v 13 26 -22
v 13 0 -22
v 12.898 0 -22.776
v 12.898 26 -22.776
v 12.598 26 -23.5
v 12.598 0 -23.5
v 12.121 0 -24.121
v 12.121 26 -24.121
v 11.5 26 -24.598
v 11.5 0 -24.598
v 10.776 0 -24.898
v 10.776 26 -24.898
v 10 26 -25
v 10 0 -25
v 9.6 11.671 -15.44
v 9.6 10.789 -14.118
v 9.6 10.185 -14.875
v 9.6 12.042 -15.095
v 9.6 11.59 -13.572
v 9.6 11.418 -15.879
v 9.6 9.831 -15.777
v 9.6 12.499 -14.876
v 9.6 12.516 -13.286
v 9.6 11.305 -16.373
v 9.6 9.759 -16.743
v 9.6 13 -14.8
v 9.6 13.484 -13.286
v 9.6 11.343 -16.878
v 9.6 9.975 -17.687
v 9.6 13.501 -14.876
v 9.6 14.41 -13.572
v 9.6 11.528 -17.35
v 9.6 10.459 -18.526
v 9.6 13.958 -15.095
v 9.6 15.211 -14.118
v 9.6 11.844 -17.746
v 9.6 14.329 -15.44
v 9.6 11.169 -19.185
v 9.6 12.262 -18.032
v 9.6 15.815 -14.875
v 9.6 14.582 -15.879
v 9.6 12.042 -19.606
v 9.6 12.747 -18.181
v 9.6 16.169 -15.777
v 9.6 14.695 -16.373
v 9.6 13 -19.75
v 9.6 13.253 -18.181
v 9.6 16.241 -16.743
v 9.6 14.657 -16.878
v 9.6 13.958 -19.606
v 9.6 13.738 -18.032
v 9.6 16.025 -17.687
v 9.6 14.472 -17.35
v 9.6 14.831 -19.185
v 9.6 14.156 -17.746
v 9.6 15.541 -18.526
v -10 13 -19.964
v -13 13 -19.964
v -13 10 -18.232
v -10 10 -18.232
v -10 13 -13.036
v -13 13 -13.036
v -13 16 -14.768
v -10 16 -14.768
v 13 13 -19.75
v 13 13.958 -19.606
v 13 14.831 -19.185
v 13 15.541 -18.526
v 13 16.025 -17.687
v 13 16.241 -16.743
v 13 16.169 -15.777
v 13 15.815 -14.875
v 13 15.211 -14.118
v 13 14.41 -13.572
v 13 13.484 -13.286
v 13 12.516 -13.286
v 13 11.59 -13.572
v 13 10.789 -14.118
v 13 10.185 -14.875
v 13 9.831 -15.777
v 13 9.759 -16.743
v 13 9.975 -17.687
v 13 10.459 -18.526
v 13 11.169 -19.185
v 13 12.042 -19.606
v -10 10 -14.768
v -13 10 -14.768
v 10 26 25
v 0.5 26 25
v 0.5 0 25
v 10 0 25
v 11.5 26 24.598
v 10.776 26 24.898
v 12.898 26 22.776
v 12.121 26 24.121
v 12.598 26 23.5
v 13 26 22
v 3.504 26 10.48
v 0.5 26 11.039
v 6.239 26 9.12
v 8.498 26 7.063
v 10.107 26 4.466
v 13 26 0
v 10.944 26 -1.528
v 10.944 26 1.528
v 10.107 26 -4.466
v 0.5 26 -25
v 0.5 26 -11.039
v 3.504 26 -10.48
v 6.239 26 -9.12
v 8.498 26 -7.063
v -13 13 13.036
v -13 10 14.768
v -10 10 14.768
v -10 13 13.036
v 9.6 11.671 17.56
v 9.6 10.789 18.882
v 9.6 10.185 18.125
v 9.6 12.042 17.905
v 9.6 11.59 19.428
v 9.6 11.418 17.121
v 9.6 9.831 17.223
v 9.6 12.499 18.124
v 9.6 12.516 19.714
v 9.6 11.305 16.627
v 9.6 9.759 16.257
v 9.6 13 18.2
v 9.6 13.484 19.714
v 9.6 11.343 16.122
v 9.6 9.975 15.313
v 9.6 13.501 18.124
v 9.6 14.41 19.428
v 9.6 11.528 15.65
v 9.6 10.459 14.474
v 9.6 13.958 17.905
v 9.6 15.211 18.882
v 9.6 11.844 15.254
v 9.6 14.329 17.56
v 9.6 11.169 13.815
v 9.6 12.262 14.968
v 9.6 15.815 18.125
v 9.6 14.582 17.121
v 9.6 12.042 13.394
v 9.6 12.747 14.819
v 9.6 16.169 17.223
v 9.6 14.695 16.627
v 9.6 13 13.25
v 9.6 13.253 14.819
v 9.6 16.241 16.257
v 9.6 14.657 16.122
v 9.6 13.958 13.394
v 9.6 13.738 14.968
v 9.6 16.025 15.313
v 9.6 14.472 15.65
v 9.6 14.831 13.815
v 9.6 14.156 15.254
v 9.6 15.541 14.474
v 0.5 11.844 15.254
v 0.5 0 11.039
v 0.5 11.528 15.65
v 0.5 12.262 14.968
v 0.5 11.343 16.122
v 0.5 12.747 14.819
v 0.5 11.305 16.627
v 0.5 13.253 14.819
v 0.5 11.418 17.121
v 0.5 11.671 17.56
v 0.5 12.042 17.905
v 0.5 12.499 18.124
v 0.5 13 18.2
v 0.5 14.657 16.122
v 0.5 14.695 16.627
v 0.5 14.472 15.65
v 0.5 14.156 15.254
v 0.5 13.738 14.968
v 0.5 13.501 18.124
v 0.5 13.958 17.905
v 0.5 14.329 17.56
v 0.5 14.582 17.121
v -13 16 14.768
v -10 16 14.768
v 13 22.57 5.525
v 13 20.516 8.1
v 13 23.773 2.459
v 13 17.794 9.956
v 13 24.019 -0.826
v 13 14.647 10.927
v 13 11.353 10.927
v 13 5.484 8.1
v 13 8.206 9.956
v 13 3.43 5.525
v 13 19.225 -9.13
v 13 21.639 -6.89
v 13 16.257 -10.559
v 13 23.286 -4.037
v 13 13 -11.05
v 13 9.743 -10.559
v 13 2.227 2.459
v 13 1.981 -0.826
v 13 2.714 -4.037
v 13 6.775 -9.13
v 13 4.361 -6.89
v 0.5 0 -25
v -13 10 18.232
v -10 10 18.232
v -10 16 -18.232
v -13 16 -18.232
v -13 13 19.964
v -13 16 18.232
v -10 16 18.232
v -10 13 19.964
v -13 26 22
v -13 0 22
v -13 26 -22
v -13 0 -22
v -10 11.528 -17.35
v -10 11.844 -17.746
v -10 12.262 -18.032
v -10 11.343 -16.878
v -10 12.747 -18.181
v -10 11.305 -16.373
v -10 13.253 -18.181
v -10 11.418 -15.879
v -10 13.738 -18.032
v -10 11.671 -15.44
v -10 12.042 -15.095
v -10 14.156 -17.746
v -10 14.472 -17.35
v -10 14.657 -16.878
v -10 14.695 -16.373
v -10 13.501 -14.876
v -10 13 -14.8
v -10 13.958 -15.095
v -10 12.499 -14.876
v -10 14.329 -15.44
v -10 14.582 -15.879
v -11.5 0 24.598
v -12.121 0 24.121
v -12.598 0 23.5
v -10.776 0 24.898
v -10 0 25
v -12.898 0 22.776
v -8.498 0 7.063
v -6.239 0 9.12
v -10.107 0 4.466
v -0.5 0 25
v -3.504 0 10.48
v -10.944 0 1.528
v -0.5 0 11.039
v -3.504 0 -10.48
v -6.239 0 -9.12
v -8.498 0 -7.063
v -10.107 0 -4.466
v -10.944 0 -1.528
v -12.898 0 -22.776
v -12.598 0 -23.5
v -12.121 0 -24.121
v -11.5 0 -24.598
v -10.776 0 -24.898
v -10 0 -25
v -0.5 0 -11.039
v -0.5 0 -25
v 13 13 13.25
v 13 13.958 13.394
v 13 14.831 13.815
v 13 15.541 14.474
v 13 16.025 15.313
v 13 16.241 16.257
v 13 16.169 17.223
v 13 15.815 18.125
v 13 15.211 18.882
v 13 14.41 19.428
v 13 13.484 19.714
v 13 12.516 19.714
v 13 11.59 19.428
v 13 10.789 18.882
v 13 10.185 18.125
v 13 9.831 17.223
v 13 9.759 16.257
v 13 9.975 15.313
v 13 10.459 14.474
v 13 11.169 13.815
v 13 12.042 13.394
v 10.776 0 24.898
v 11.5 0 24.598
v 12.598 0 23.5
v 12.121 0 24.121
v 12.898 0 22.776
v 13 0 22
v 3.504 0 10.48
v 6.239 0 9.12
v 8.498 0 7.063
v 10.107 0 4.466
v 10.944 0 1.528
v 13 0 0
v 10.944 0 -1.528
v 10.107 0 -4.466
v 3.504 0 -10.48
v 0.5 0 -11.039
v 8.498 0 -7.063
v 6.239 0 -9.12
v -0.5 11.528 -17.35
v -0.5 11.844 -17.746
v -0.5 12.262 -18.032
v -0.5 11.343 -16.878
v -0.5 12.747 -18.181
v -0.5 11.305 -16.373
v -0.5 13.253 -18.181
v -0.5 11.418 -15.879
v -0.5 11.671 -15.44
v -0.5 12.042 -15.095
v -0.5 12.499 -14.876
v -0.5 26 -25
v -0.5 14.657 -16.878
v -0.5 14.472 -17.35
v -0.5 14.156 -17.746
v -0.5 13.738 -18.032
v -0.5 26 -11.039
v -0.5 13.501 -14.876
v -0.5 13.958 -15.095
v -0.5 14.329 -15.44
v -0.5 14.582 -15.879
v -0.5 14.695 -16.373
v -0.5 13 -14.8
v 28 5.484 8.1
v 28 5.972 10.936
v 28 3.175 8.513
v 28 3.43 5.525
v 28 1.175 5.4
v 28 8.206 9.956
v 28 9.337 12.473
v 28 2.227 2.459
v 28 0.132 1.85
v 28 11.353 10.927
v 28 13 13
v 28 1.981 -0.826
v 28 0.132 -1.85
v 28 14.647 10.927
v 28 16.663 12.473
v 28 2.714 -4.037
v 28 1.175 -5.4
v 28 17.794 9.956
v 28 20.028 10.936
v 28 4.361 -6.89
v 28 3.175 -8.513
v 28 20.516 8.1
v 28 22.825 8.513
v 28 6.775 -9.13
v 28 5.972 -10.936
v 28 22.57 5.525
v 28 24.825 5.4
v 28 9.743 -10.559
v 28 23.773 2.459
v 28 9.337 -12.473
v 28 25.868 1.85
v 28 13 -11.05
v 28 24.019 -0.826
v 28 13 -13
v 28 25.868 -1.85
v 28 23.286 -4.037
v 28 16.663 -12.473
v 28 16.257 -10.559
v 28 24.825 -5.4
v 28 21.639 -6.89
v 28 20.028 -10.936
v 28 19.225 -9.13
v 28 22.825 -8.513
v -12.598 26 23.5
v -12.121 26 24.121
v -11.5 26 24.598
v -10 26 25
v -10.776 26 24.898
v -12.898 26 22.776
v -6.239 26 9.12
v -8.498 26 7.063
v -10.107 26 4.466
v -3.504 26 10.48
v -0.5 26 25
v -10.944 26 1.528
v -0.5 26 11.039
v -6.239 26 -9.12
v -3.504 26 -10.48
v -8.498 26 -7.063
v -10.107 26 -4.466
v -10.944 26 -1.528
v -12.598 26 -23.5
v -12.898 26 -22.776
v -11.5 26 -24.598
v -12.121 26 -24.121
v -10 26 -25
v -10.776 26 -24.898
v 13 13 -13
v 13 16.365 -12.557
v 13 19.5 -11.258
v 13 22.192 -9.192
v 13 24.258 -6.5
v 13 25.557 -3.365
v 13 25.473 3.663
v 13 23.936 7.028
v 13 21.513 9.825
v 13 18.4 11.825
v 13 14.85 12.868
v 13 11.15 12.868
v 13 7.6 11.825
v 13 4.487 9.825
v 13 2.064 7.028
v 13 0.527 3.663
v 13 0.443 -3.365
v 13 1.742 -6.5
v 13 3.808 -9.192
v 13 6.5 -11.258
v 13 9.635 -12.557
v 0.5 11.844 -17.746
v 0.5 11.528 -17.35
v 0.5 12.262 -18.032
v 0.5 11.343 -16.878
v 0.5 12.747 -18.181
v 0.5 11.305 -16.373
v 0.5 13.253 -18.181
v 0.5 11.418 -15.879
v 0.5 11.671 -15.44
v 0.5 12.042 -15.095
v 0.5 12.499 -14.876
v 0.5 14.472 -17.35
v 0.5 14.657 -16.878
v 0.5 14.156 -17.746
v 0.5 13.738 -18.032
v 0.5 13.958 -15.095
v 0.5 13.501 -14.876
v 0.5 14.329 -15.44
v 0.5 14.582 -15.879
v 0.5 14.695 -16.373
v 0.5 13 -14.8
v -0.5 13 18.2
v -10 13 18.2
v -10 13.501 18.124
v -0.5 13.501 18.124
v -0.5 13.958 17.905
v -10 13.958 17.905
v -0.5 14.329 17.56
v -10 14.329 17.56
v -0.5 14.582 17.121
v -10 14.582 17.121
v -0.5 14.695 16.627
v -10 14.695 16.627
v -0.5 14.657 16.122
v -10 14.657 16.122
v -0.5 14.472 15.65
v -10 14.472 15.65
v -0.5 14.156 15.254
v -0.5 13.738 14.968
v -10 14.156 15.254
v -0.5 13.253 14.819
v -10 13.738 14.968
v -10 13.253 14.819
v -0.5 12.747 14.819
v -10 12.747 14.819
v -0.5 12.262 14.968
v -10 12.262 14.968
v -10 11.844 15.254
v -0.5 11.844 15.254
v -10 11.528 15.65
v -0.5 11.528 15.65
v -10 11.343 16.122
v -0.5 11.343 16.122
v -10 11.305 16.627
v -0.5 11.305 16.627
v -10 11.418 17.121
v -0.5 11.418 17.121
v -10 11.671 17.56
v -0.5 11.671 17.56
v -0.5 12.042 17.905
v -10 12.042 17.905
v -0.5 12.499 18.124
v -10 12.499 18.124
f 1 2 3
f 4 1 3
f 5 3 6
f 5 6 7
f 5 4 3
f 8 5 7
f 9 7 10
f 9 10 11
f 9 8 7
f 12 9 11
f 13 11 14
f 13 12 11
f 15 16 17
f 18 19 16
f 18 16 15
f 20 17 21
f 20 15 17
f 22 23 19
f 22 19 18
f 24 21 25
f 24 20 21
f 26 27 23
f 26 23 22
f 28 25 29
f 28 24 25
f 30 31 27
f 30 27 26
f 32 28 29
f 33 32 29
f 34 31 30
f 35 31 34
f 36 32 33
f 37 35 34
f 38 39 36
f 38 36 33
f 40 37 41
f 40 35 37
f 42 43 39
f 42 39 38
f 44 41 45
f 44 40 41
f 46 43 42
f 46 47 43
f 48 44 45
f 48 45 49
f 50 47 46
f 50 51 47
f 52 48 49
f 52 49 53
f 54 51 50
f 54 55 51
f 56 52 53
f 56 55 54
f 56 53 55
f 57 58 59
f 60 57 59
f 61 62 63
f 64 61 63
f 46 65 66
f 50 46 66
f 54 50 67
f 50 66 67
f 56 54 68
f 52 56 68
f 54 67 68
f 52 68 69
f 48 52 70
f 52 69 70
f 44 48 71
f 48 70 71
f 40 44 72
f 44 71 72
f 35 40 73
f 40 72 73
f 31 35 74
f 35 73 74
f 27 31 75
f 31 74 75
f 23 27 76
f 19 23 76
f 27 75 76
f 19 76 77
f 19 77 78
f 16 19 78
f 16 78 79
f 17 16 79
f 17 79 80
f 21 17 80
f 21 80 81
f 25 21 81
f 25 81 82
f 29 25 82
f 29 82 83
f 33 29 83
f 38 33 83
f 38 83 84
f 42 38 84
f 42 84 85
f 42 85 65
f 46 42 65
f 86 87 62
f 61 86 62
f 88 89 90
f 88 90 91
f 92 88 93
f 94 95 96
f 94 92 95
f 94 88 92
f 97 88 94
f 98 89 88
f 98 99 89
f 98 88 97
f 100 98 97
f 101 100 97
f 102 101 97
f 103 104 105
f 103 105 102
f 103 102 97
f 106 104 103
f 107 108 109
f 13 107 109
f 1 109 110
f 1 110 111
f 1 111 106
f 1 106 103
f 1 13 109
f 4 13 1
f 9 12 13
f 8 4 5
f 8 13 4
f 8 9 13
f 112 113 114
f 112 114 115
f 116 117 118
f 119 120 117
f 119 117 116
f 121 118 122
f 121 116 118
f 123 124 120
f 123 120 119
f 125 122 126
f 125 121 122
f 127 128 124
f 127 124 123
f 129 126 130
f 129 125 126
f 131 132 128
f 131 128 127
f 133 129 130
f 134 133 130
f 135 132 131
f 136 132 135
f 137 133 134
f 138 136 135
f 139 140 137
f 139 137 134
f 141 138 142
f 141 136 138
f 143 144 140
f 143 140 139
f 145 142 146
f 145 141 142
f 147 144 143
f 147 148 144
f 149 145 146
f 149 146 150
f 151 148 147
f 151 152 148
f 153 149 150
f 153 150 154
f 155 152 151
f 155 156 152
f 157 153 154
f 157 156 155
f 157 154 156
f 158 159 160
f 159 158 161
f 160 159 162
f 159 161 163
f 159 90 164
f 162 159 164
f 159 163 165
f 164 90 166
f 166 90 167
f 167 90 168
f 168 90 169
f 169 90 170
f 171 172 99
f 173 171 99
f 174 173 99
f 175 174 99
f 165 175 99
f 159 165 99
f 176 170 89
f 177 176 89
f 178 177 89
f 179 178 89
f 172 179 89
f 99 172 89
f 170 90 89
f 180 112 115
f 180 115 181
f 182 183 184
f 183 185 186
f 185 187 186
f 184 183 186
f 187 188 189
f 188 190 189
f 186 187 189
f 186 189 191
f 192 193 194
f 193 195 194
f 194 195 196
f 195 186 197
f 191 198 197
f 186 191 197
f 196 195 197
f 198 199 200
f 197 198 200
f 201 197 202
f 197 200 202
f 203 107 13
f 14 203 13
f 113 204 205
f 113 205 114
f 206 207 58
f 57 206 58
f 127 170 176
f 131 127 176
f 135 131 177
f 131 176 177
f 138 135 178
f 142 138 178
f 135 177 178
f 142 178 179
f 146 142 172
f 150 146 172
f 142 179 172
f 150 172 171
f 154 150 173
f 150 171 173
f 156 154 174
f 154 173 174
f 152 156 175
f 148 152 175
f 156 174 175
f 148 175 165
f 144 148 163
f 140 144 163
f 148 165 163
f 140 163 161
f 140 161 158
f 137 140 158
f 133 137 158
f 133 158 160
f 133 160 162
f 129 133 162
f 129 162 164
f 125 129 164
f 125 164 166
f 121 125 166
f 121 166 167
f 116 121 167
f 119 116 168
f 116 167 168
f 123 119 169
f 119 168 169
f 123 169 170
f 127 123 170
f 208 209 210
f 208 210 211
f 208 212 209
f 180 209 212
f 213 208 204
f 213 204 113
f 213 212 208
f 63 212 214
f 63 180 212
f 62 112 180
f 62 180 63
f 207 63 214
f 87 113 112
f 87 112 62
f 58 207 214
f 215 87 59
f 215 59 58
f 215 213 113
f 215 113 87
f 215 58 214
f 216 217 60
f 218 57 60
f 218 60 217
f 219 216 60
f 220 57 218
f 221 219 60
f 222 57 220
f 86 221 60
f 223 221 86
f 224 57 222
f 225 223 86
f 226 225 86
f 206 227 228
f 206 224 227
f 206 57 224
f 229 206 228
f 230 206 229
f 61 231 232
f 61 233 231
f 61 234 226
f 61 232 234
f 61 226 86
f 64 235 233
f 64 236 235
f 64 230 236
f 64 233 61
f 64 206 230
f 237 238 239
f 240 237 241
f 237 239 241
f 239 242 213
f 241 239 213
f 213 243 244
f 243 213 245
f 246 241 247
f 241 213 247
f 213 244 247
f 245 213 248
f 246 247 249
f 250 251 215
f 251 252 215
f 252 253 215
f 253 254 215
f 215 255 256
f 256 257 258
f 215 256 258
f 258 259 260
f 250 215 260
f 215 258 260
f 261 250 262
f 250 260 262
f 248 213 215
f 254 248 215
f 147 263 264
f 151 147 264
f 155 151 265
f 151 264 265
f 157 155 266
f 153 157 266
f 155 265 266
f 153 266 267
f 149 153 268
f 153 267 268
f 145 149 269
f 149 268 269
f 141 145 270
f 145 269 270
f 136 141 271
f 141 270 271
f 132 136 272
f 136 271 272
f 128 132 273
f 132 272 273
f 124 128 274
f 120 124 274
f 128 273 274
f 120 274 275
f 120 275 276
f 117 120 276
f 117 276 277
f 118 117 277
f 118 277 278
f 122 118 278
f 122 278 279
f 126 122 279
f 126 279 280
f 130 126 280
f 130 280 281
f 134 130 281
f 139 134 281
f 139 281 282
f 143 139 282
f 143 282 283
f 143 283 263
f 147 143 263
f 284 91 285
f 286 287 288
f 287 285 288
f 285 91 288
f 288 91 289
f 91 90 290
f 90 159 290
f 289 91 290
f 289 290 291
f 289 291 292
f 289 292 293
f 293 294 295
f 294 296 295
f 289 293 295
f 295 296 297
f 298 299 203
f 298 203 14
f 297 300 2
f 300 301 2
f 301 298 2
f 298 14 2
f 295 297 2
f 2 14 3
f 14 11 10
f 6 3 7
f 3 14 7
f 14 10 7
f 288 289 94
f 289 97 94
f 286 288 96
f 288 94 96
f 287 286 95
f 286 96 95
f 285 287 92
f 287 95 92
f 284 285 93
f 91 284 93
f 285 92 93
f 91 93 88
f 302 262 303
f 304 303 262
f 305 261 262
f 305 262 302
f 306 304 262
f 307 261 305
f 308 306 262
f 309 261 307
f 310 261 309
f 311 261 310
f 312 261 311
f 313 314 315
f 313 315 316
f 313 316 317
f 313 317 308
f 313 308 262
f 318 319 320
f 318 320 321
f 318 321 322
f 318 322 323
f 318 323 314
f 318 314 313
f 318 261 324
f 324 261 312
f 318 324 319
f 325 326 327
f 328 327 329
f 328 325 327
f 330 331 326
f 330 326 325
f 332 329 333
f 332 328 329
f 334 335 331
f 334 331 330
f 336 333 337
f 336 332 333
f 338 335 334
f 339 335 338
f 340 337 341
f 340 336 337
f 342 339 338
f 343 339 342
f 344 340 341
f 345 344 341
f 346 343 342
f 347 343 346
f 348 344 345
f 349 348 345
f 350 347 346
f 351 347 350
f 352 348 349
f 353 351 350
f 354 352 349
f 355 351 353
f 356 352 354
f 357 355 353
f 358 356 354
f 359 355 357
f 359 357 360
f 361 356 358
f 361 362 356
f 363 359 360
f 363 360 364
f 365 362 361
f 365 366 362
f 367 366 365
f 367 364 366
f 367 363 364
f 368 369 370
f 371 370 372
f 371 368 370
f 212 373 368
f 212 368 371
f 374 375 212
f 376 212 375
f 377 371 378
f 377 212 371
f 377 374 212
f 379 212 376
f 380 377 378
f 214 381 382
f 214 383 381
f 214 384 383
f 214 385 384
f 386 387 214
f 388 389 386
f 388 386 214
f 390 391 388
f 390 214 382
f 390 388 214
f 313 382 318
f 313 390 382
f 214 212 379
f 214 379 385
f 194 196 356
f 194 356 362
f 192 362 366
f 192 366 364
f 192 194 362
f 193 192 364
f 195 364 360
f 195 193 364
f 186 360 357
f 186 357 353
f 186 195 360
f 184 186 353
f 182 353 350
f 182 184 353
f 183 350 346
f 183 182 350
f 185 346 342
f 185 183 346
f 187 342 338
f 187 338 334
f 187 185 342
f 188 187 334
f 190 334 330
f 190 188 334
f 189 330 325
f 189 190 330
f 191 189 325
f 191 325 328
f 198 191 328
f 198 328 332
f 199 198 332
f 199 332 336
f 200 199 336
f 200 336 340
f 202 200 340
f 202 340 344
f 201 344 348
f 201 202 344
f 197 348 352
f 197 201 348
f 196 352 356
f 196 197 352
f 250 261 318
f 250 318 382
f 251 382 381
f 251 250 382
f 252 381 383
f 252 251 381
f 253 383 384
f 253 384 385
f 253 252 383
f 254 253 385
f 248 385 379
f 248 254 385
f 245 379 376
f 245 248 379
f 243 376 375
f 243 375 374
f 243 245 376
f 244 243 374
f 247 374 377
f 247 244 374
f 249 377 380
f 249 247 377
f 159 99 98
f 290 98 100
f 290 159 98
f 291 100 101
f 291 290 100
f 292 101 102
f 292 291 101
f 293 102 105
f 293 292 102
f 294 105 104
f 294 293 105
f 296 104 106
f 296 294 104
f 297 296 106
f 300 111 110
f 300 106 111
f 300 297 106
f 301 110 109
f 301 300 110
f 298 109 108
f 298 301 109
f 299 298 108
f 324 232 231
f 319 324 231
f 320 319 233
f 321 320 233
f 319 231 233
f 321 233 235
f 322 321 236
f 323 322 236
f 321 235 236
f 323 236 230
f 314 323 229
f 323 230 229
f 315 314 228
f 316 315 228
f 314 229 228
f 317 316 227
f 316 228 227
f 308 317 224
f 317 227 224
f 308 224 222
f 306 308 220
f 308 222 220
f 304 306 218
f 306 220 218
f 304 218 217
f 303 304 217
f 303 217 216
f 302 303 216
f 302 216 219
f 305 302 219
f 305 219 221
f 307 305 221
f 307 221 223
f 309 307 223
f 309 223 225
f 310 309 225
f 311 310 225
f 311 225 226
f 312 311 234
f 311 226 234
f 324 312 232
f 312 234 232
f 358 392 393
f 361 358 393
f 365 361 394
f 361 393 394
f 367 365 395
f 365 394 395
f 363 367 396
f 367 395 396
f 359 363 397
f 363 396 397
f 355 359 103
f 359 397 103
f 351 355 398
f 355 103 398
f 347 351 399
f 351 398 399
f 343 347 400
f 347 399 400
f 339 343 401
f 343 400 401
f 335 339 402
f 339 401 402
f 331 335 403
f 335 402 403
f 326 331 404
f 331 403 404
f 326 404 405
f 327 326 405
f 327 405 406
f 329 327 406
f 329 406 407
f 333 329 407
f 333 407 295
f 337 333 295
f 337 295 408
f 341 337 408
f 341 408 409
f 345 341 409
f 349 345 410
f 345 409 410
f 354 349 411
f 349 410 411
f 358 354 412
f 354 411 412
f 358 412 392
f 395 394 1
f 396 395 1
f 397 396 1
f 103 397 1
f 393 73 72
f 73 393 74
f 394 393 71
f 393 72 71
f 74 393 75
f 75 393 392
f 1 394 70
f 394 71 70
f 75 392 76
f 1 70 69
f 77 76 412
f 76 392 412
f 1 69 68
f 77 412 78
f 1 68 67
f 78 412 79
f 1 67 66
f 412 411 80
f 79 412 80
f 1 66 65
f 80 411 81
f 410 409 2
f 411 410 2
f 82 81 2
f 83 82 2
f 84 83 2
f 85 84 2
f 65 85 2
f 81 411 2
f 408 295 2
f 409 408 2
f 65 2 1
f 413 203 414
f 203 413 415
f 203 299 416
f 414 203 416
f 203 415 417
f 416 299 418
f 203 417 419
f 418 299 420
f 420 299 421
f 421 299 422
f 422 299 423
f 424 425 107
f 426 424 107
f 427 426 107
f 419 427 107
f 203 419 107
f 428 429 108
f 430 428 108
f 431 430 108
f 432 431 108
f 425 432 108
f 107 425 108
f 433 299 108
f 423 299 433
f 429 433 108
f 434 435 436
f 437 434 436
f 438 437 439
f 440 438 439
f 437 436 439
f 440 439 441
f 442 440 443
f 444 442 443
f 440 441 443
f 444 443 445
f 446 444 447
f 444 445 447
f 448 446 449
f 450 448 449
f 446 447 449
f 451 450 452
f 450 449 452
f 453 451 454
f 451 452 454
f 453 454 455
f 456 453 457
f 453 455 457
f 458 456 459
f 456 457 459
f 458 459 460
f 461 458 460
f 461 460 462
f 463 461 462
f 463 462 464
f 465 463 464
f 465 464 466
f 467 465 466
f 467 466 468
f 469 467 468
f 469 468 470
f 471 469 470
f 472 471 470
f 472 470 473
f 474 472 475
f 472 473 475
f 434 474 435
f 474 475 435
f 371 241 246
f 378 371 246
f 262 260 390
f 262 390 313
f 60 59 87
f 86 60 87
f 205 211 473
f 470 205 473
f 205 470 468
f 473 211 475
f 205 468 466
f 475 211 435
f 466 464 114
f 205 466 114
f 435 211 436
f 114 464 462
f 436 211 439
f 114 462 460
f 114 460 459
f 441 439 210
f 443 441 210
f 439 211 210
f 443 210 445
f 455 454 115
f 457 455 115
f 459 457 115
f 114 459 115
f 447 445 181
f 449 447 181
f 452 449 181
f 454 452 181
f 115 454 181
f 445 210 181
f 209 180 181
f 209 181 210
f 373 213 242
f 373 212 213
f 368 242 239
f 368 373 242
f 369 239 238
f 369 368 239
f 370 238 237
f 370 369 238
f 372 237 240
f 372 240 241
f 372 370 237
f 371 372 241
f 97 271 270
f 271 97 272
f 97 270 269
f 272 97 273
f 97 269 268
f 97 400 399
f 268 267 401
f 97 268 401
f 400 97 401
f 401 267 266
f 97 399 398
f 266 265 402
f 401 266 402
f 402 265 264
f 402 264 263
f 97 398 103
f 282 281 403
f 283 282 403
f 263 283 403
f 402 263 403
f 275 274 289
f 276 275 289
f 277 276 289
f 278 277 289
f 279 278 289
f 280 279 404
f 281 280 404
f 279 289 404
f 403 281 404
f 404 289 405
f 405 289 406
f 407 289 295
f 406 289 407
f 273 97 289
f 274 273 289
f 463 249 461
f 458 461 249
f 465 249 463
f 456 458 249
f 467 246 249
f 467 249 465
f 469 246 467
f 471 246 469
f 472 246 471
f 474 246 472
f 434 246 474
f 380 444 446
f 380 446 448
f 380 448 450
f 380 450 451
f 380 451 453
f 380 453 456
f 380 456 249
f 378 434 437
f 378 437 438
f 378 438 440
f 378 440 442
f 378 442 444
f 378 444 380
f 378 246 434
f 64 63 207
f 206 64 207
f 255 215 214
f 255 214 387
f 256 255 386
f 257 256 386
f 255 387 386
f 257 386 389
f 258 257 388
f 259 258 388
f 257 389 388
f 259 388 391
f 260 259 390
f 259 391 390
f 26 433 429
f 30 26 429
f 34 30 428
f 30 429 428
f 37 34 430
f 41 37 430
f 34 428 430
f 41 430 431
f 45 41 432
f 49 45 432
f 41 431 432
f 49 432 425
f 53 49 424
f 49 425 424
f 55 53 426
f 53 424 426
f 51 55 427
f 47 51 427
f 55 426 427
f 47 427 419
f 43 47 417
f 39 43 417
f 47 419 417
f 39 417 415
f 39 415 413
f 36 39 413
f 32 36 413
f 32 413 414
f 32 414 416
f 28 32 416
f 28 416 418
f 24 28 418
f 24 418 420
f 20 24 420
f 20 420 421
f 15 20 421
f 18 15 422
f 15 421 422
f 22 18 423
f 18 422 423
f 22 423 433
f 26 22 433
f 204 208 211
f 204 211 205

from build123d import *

# Parameters (mm, degrees)
CROQUIS1_W                                           = 26
CROQUIS1_H                                           = 50
CROQUIS1_R                                           = 11.05
SALIENTE_EXTRUIR3_DEPTH                              = 26
REFRENTADO_PARA_TORNILLO_CON_CABEZA_HUEC_D           = 3.4
REFRENTADO_PARA_TORNILLO_CON_CABEZA_HUEC_CBORE_D     = 6.5
REFRENTADO_PARA_TORNILLO_CON_CABEZA_HUEC_CBORE_DEPTH = 3.4
CROQUIS26_W                                          = 1
CROQUIS26_H                                          = 26
CORTAR_EXTRUIR2_DEPTH                                = 51
CORTAR_EXTRUIR3_DEPTH                                = 3
CROQUIS28_R                                          = 13
CROQUIS28_R_2                                        = 11.05
SALIENTE_EXTRUIR4_DEPTH                              = 15
REDONDEO1_R                                          = 3
REDONDEO2_R                                          = 3


with BuildPart() as part:
    # Croquis1 → Saliente-Extruir3 (new body)
    with BuildSketch(Plane(origin=(0, 0, 0), x_dir=(1, 0, 0), z_dir=(0, 1, 0))):
        Rectangle(CROQUIS1_W, CROQUIS1_H)
        Circle(CROQUIS1_R, mode=Mode.SUBTRACT)
    extrude(amount=SALIENTE_EXTRUIR3_DEPTH)

    # Refrentado para tornillo con cabeza hueca de M31 (through all)
    with Locations(Plane(origin=(13, 0, 0), x_dir=(0, 0, -1), z_dir=(1, 0, 0))):
        with Locations((-16.5, 13), (16.5, 13)):
            CounterBoreHole(REFRENTADO_PARA_TORNILLO_CON_CABEZA_HUEC_D / 2, REFRENTADO_PARA_TORNILLO_CON_CABEZA_HUEC_CBORE_D / 2, REFRENTADO_PARA_TORNILLO_CON_CABEZA_HUEC_CBORE_DEPTH)

    # Croquis26 → Cortar-Extruir2 (cut, through all)
    with BuildSketch(Plane.XY.offset(25)):
        with Locations((0, 13)):
            Rectangle(CROQUIS26_W, CROQUIS26_H)
    extrude(amount=-CORTAR_EXTRUIR2_DEPTH, mode=Mode.SUBTRACT)

    # Croquis27 → Cortar-Extruir3 (cut)
    with BuildSketch(Plane.ZY.offset(13)):
        Polygon((-13.035898385, 13), (-14.767949192, 16), (-18.232050808, 16), (-19.964101615, 13), (-18.232050808, 10), (-14.767949192, 10), align=None)
    cortar_extruir3 = extrude(amount=-CORTAR_EXTRUIR3_DEPTH, mode=Mode.SUBTRACT)

    # Simetría8: Cortar-Extruir3 across plane
    add(cortar_extruir3.mirror(Plane.XY), mode=Mode.SUBTRACT)

    # Croquis28 → Saliente-Extruir4 (add)
    with BuildSketch(Plane(origin=(13, 0, 0), x_dir=(0, 0, -1), z_dir=(1, 0, 0))):
        with Locations((0, 13)):
            Circle(CROQUIS28_R)
        with Locations((0, 13)):
            Circle(CROQUIS28_R_2, mode=Mode.SUBTRACT)
    extrude(amount=SALIENTE_EXTRUIR4_DEPTH)

    # Redondeo1
    redondeo1_edges = [part.edges().sort_by_distance(p)[0] for p in [
        (13, 13, 25),
        (13, 13, -25),
    ]]
    fillet(redondeo1_edges, radius=REDONDEO1_R)

    # Redondeo2
    redondeo2_edges = [part.edges().sort_by_distance(p)[0] for p in [
        (-13, 13, 25),
        (-13, 13, -25),
    ]]
    fillet(redondeo2_edges, radius=REDONDEO2_R)


solid = part.part
